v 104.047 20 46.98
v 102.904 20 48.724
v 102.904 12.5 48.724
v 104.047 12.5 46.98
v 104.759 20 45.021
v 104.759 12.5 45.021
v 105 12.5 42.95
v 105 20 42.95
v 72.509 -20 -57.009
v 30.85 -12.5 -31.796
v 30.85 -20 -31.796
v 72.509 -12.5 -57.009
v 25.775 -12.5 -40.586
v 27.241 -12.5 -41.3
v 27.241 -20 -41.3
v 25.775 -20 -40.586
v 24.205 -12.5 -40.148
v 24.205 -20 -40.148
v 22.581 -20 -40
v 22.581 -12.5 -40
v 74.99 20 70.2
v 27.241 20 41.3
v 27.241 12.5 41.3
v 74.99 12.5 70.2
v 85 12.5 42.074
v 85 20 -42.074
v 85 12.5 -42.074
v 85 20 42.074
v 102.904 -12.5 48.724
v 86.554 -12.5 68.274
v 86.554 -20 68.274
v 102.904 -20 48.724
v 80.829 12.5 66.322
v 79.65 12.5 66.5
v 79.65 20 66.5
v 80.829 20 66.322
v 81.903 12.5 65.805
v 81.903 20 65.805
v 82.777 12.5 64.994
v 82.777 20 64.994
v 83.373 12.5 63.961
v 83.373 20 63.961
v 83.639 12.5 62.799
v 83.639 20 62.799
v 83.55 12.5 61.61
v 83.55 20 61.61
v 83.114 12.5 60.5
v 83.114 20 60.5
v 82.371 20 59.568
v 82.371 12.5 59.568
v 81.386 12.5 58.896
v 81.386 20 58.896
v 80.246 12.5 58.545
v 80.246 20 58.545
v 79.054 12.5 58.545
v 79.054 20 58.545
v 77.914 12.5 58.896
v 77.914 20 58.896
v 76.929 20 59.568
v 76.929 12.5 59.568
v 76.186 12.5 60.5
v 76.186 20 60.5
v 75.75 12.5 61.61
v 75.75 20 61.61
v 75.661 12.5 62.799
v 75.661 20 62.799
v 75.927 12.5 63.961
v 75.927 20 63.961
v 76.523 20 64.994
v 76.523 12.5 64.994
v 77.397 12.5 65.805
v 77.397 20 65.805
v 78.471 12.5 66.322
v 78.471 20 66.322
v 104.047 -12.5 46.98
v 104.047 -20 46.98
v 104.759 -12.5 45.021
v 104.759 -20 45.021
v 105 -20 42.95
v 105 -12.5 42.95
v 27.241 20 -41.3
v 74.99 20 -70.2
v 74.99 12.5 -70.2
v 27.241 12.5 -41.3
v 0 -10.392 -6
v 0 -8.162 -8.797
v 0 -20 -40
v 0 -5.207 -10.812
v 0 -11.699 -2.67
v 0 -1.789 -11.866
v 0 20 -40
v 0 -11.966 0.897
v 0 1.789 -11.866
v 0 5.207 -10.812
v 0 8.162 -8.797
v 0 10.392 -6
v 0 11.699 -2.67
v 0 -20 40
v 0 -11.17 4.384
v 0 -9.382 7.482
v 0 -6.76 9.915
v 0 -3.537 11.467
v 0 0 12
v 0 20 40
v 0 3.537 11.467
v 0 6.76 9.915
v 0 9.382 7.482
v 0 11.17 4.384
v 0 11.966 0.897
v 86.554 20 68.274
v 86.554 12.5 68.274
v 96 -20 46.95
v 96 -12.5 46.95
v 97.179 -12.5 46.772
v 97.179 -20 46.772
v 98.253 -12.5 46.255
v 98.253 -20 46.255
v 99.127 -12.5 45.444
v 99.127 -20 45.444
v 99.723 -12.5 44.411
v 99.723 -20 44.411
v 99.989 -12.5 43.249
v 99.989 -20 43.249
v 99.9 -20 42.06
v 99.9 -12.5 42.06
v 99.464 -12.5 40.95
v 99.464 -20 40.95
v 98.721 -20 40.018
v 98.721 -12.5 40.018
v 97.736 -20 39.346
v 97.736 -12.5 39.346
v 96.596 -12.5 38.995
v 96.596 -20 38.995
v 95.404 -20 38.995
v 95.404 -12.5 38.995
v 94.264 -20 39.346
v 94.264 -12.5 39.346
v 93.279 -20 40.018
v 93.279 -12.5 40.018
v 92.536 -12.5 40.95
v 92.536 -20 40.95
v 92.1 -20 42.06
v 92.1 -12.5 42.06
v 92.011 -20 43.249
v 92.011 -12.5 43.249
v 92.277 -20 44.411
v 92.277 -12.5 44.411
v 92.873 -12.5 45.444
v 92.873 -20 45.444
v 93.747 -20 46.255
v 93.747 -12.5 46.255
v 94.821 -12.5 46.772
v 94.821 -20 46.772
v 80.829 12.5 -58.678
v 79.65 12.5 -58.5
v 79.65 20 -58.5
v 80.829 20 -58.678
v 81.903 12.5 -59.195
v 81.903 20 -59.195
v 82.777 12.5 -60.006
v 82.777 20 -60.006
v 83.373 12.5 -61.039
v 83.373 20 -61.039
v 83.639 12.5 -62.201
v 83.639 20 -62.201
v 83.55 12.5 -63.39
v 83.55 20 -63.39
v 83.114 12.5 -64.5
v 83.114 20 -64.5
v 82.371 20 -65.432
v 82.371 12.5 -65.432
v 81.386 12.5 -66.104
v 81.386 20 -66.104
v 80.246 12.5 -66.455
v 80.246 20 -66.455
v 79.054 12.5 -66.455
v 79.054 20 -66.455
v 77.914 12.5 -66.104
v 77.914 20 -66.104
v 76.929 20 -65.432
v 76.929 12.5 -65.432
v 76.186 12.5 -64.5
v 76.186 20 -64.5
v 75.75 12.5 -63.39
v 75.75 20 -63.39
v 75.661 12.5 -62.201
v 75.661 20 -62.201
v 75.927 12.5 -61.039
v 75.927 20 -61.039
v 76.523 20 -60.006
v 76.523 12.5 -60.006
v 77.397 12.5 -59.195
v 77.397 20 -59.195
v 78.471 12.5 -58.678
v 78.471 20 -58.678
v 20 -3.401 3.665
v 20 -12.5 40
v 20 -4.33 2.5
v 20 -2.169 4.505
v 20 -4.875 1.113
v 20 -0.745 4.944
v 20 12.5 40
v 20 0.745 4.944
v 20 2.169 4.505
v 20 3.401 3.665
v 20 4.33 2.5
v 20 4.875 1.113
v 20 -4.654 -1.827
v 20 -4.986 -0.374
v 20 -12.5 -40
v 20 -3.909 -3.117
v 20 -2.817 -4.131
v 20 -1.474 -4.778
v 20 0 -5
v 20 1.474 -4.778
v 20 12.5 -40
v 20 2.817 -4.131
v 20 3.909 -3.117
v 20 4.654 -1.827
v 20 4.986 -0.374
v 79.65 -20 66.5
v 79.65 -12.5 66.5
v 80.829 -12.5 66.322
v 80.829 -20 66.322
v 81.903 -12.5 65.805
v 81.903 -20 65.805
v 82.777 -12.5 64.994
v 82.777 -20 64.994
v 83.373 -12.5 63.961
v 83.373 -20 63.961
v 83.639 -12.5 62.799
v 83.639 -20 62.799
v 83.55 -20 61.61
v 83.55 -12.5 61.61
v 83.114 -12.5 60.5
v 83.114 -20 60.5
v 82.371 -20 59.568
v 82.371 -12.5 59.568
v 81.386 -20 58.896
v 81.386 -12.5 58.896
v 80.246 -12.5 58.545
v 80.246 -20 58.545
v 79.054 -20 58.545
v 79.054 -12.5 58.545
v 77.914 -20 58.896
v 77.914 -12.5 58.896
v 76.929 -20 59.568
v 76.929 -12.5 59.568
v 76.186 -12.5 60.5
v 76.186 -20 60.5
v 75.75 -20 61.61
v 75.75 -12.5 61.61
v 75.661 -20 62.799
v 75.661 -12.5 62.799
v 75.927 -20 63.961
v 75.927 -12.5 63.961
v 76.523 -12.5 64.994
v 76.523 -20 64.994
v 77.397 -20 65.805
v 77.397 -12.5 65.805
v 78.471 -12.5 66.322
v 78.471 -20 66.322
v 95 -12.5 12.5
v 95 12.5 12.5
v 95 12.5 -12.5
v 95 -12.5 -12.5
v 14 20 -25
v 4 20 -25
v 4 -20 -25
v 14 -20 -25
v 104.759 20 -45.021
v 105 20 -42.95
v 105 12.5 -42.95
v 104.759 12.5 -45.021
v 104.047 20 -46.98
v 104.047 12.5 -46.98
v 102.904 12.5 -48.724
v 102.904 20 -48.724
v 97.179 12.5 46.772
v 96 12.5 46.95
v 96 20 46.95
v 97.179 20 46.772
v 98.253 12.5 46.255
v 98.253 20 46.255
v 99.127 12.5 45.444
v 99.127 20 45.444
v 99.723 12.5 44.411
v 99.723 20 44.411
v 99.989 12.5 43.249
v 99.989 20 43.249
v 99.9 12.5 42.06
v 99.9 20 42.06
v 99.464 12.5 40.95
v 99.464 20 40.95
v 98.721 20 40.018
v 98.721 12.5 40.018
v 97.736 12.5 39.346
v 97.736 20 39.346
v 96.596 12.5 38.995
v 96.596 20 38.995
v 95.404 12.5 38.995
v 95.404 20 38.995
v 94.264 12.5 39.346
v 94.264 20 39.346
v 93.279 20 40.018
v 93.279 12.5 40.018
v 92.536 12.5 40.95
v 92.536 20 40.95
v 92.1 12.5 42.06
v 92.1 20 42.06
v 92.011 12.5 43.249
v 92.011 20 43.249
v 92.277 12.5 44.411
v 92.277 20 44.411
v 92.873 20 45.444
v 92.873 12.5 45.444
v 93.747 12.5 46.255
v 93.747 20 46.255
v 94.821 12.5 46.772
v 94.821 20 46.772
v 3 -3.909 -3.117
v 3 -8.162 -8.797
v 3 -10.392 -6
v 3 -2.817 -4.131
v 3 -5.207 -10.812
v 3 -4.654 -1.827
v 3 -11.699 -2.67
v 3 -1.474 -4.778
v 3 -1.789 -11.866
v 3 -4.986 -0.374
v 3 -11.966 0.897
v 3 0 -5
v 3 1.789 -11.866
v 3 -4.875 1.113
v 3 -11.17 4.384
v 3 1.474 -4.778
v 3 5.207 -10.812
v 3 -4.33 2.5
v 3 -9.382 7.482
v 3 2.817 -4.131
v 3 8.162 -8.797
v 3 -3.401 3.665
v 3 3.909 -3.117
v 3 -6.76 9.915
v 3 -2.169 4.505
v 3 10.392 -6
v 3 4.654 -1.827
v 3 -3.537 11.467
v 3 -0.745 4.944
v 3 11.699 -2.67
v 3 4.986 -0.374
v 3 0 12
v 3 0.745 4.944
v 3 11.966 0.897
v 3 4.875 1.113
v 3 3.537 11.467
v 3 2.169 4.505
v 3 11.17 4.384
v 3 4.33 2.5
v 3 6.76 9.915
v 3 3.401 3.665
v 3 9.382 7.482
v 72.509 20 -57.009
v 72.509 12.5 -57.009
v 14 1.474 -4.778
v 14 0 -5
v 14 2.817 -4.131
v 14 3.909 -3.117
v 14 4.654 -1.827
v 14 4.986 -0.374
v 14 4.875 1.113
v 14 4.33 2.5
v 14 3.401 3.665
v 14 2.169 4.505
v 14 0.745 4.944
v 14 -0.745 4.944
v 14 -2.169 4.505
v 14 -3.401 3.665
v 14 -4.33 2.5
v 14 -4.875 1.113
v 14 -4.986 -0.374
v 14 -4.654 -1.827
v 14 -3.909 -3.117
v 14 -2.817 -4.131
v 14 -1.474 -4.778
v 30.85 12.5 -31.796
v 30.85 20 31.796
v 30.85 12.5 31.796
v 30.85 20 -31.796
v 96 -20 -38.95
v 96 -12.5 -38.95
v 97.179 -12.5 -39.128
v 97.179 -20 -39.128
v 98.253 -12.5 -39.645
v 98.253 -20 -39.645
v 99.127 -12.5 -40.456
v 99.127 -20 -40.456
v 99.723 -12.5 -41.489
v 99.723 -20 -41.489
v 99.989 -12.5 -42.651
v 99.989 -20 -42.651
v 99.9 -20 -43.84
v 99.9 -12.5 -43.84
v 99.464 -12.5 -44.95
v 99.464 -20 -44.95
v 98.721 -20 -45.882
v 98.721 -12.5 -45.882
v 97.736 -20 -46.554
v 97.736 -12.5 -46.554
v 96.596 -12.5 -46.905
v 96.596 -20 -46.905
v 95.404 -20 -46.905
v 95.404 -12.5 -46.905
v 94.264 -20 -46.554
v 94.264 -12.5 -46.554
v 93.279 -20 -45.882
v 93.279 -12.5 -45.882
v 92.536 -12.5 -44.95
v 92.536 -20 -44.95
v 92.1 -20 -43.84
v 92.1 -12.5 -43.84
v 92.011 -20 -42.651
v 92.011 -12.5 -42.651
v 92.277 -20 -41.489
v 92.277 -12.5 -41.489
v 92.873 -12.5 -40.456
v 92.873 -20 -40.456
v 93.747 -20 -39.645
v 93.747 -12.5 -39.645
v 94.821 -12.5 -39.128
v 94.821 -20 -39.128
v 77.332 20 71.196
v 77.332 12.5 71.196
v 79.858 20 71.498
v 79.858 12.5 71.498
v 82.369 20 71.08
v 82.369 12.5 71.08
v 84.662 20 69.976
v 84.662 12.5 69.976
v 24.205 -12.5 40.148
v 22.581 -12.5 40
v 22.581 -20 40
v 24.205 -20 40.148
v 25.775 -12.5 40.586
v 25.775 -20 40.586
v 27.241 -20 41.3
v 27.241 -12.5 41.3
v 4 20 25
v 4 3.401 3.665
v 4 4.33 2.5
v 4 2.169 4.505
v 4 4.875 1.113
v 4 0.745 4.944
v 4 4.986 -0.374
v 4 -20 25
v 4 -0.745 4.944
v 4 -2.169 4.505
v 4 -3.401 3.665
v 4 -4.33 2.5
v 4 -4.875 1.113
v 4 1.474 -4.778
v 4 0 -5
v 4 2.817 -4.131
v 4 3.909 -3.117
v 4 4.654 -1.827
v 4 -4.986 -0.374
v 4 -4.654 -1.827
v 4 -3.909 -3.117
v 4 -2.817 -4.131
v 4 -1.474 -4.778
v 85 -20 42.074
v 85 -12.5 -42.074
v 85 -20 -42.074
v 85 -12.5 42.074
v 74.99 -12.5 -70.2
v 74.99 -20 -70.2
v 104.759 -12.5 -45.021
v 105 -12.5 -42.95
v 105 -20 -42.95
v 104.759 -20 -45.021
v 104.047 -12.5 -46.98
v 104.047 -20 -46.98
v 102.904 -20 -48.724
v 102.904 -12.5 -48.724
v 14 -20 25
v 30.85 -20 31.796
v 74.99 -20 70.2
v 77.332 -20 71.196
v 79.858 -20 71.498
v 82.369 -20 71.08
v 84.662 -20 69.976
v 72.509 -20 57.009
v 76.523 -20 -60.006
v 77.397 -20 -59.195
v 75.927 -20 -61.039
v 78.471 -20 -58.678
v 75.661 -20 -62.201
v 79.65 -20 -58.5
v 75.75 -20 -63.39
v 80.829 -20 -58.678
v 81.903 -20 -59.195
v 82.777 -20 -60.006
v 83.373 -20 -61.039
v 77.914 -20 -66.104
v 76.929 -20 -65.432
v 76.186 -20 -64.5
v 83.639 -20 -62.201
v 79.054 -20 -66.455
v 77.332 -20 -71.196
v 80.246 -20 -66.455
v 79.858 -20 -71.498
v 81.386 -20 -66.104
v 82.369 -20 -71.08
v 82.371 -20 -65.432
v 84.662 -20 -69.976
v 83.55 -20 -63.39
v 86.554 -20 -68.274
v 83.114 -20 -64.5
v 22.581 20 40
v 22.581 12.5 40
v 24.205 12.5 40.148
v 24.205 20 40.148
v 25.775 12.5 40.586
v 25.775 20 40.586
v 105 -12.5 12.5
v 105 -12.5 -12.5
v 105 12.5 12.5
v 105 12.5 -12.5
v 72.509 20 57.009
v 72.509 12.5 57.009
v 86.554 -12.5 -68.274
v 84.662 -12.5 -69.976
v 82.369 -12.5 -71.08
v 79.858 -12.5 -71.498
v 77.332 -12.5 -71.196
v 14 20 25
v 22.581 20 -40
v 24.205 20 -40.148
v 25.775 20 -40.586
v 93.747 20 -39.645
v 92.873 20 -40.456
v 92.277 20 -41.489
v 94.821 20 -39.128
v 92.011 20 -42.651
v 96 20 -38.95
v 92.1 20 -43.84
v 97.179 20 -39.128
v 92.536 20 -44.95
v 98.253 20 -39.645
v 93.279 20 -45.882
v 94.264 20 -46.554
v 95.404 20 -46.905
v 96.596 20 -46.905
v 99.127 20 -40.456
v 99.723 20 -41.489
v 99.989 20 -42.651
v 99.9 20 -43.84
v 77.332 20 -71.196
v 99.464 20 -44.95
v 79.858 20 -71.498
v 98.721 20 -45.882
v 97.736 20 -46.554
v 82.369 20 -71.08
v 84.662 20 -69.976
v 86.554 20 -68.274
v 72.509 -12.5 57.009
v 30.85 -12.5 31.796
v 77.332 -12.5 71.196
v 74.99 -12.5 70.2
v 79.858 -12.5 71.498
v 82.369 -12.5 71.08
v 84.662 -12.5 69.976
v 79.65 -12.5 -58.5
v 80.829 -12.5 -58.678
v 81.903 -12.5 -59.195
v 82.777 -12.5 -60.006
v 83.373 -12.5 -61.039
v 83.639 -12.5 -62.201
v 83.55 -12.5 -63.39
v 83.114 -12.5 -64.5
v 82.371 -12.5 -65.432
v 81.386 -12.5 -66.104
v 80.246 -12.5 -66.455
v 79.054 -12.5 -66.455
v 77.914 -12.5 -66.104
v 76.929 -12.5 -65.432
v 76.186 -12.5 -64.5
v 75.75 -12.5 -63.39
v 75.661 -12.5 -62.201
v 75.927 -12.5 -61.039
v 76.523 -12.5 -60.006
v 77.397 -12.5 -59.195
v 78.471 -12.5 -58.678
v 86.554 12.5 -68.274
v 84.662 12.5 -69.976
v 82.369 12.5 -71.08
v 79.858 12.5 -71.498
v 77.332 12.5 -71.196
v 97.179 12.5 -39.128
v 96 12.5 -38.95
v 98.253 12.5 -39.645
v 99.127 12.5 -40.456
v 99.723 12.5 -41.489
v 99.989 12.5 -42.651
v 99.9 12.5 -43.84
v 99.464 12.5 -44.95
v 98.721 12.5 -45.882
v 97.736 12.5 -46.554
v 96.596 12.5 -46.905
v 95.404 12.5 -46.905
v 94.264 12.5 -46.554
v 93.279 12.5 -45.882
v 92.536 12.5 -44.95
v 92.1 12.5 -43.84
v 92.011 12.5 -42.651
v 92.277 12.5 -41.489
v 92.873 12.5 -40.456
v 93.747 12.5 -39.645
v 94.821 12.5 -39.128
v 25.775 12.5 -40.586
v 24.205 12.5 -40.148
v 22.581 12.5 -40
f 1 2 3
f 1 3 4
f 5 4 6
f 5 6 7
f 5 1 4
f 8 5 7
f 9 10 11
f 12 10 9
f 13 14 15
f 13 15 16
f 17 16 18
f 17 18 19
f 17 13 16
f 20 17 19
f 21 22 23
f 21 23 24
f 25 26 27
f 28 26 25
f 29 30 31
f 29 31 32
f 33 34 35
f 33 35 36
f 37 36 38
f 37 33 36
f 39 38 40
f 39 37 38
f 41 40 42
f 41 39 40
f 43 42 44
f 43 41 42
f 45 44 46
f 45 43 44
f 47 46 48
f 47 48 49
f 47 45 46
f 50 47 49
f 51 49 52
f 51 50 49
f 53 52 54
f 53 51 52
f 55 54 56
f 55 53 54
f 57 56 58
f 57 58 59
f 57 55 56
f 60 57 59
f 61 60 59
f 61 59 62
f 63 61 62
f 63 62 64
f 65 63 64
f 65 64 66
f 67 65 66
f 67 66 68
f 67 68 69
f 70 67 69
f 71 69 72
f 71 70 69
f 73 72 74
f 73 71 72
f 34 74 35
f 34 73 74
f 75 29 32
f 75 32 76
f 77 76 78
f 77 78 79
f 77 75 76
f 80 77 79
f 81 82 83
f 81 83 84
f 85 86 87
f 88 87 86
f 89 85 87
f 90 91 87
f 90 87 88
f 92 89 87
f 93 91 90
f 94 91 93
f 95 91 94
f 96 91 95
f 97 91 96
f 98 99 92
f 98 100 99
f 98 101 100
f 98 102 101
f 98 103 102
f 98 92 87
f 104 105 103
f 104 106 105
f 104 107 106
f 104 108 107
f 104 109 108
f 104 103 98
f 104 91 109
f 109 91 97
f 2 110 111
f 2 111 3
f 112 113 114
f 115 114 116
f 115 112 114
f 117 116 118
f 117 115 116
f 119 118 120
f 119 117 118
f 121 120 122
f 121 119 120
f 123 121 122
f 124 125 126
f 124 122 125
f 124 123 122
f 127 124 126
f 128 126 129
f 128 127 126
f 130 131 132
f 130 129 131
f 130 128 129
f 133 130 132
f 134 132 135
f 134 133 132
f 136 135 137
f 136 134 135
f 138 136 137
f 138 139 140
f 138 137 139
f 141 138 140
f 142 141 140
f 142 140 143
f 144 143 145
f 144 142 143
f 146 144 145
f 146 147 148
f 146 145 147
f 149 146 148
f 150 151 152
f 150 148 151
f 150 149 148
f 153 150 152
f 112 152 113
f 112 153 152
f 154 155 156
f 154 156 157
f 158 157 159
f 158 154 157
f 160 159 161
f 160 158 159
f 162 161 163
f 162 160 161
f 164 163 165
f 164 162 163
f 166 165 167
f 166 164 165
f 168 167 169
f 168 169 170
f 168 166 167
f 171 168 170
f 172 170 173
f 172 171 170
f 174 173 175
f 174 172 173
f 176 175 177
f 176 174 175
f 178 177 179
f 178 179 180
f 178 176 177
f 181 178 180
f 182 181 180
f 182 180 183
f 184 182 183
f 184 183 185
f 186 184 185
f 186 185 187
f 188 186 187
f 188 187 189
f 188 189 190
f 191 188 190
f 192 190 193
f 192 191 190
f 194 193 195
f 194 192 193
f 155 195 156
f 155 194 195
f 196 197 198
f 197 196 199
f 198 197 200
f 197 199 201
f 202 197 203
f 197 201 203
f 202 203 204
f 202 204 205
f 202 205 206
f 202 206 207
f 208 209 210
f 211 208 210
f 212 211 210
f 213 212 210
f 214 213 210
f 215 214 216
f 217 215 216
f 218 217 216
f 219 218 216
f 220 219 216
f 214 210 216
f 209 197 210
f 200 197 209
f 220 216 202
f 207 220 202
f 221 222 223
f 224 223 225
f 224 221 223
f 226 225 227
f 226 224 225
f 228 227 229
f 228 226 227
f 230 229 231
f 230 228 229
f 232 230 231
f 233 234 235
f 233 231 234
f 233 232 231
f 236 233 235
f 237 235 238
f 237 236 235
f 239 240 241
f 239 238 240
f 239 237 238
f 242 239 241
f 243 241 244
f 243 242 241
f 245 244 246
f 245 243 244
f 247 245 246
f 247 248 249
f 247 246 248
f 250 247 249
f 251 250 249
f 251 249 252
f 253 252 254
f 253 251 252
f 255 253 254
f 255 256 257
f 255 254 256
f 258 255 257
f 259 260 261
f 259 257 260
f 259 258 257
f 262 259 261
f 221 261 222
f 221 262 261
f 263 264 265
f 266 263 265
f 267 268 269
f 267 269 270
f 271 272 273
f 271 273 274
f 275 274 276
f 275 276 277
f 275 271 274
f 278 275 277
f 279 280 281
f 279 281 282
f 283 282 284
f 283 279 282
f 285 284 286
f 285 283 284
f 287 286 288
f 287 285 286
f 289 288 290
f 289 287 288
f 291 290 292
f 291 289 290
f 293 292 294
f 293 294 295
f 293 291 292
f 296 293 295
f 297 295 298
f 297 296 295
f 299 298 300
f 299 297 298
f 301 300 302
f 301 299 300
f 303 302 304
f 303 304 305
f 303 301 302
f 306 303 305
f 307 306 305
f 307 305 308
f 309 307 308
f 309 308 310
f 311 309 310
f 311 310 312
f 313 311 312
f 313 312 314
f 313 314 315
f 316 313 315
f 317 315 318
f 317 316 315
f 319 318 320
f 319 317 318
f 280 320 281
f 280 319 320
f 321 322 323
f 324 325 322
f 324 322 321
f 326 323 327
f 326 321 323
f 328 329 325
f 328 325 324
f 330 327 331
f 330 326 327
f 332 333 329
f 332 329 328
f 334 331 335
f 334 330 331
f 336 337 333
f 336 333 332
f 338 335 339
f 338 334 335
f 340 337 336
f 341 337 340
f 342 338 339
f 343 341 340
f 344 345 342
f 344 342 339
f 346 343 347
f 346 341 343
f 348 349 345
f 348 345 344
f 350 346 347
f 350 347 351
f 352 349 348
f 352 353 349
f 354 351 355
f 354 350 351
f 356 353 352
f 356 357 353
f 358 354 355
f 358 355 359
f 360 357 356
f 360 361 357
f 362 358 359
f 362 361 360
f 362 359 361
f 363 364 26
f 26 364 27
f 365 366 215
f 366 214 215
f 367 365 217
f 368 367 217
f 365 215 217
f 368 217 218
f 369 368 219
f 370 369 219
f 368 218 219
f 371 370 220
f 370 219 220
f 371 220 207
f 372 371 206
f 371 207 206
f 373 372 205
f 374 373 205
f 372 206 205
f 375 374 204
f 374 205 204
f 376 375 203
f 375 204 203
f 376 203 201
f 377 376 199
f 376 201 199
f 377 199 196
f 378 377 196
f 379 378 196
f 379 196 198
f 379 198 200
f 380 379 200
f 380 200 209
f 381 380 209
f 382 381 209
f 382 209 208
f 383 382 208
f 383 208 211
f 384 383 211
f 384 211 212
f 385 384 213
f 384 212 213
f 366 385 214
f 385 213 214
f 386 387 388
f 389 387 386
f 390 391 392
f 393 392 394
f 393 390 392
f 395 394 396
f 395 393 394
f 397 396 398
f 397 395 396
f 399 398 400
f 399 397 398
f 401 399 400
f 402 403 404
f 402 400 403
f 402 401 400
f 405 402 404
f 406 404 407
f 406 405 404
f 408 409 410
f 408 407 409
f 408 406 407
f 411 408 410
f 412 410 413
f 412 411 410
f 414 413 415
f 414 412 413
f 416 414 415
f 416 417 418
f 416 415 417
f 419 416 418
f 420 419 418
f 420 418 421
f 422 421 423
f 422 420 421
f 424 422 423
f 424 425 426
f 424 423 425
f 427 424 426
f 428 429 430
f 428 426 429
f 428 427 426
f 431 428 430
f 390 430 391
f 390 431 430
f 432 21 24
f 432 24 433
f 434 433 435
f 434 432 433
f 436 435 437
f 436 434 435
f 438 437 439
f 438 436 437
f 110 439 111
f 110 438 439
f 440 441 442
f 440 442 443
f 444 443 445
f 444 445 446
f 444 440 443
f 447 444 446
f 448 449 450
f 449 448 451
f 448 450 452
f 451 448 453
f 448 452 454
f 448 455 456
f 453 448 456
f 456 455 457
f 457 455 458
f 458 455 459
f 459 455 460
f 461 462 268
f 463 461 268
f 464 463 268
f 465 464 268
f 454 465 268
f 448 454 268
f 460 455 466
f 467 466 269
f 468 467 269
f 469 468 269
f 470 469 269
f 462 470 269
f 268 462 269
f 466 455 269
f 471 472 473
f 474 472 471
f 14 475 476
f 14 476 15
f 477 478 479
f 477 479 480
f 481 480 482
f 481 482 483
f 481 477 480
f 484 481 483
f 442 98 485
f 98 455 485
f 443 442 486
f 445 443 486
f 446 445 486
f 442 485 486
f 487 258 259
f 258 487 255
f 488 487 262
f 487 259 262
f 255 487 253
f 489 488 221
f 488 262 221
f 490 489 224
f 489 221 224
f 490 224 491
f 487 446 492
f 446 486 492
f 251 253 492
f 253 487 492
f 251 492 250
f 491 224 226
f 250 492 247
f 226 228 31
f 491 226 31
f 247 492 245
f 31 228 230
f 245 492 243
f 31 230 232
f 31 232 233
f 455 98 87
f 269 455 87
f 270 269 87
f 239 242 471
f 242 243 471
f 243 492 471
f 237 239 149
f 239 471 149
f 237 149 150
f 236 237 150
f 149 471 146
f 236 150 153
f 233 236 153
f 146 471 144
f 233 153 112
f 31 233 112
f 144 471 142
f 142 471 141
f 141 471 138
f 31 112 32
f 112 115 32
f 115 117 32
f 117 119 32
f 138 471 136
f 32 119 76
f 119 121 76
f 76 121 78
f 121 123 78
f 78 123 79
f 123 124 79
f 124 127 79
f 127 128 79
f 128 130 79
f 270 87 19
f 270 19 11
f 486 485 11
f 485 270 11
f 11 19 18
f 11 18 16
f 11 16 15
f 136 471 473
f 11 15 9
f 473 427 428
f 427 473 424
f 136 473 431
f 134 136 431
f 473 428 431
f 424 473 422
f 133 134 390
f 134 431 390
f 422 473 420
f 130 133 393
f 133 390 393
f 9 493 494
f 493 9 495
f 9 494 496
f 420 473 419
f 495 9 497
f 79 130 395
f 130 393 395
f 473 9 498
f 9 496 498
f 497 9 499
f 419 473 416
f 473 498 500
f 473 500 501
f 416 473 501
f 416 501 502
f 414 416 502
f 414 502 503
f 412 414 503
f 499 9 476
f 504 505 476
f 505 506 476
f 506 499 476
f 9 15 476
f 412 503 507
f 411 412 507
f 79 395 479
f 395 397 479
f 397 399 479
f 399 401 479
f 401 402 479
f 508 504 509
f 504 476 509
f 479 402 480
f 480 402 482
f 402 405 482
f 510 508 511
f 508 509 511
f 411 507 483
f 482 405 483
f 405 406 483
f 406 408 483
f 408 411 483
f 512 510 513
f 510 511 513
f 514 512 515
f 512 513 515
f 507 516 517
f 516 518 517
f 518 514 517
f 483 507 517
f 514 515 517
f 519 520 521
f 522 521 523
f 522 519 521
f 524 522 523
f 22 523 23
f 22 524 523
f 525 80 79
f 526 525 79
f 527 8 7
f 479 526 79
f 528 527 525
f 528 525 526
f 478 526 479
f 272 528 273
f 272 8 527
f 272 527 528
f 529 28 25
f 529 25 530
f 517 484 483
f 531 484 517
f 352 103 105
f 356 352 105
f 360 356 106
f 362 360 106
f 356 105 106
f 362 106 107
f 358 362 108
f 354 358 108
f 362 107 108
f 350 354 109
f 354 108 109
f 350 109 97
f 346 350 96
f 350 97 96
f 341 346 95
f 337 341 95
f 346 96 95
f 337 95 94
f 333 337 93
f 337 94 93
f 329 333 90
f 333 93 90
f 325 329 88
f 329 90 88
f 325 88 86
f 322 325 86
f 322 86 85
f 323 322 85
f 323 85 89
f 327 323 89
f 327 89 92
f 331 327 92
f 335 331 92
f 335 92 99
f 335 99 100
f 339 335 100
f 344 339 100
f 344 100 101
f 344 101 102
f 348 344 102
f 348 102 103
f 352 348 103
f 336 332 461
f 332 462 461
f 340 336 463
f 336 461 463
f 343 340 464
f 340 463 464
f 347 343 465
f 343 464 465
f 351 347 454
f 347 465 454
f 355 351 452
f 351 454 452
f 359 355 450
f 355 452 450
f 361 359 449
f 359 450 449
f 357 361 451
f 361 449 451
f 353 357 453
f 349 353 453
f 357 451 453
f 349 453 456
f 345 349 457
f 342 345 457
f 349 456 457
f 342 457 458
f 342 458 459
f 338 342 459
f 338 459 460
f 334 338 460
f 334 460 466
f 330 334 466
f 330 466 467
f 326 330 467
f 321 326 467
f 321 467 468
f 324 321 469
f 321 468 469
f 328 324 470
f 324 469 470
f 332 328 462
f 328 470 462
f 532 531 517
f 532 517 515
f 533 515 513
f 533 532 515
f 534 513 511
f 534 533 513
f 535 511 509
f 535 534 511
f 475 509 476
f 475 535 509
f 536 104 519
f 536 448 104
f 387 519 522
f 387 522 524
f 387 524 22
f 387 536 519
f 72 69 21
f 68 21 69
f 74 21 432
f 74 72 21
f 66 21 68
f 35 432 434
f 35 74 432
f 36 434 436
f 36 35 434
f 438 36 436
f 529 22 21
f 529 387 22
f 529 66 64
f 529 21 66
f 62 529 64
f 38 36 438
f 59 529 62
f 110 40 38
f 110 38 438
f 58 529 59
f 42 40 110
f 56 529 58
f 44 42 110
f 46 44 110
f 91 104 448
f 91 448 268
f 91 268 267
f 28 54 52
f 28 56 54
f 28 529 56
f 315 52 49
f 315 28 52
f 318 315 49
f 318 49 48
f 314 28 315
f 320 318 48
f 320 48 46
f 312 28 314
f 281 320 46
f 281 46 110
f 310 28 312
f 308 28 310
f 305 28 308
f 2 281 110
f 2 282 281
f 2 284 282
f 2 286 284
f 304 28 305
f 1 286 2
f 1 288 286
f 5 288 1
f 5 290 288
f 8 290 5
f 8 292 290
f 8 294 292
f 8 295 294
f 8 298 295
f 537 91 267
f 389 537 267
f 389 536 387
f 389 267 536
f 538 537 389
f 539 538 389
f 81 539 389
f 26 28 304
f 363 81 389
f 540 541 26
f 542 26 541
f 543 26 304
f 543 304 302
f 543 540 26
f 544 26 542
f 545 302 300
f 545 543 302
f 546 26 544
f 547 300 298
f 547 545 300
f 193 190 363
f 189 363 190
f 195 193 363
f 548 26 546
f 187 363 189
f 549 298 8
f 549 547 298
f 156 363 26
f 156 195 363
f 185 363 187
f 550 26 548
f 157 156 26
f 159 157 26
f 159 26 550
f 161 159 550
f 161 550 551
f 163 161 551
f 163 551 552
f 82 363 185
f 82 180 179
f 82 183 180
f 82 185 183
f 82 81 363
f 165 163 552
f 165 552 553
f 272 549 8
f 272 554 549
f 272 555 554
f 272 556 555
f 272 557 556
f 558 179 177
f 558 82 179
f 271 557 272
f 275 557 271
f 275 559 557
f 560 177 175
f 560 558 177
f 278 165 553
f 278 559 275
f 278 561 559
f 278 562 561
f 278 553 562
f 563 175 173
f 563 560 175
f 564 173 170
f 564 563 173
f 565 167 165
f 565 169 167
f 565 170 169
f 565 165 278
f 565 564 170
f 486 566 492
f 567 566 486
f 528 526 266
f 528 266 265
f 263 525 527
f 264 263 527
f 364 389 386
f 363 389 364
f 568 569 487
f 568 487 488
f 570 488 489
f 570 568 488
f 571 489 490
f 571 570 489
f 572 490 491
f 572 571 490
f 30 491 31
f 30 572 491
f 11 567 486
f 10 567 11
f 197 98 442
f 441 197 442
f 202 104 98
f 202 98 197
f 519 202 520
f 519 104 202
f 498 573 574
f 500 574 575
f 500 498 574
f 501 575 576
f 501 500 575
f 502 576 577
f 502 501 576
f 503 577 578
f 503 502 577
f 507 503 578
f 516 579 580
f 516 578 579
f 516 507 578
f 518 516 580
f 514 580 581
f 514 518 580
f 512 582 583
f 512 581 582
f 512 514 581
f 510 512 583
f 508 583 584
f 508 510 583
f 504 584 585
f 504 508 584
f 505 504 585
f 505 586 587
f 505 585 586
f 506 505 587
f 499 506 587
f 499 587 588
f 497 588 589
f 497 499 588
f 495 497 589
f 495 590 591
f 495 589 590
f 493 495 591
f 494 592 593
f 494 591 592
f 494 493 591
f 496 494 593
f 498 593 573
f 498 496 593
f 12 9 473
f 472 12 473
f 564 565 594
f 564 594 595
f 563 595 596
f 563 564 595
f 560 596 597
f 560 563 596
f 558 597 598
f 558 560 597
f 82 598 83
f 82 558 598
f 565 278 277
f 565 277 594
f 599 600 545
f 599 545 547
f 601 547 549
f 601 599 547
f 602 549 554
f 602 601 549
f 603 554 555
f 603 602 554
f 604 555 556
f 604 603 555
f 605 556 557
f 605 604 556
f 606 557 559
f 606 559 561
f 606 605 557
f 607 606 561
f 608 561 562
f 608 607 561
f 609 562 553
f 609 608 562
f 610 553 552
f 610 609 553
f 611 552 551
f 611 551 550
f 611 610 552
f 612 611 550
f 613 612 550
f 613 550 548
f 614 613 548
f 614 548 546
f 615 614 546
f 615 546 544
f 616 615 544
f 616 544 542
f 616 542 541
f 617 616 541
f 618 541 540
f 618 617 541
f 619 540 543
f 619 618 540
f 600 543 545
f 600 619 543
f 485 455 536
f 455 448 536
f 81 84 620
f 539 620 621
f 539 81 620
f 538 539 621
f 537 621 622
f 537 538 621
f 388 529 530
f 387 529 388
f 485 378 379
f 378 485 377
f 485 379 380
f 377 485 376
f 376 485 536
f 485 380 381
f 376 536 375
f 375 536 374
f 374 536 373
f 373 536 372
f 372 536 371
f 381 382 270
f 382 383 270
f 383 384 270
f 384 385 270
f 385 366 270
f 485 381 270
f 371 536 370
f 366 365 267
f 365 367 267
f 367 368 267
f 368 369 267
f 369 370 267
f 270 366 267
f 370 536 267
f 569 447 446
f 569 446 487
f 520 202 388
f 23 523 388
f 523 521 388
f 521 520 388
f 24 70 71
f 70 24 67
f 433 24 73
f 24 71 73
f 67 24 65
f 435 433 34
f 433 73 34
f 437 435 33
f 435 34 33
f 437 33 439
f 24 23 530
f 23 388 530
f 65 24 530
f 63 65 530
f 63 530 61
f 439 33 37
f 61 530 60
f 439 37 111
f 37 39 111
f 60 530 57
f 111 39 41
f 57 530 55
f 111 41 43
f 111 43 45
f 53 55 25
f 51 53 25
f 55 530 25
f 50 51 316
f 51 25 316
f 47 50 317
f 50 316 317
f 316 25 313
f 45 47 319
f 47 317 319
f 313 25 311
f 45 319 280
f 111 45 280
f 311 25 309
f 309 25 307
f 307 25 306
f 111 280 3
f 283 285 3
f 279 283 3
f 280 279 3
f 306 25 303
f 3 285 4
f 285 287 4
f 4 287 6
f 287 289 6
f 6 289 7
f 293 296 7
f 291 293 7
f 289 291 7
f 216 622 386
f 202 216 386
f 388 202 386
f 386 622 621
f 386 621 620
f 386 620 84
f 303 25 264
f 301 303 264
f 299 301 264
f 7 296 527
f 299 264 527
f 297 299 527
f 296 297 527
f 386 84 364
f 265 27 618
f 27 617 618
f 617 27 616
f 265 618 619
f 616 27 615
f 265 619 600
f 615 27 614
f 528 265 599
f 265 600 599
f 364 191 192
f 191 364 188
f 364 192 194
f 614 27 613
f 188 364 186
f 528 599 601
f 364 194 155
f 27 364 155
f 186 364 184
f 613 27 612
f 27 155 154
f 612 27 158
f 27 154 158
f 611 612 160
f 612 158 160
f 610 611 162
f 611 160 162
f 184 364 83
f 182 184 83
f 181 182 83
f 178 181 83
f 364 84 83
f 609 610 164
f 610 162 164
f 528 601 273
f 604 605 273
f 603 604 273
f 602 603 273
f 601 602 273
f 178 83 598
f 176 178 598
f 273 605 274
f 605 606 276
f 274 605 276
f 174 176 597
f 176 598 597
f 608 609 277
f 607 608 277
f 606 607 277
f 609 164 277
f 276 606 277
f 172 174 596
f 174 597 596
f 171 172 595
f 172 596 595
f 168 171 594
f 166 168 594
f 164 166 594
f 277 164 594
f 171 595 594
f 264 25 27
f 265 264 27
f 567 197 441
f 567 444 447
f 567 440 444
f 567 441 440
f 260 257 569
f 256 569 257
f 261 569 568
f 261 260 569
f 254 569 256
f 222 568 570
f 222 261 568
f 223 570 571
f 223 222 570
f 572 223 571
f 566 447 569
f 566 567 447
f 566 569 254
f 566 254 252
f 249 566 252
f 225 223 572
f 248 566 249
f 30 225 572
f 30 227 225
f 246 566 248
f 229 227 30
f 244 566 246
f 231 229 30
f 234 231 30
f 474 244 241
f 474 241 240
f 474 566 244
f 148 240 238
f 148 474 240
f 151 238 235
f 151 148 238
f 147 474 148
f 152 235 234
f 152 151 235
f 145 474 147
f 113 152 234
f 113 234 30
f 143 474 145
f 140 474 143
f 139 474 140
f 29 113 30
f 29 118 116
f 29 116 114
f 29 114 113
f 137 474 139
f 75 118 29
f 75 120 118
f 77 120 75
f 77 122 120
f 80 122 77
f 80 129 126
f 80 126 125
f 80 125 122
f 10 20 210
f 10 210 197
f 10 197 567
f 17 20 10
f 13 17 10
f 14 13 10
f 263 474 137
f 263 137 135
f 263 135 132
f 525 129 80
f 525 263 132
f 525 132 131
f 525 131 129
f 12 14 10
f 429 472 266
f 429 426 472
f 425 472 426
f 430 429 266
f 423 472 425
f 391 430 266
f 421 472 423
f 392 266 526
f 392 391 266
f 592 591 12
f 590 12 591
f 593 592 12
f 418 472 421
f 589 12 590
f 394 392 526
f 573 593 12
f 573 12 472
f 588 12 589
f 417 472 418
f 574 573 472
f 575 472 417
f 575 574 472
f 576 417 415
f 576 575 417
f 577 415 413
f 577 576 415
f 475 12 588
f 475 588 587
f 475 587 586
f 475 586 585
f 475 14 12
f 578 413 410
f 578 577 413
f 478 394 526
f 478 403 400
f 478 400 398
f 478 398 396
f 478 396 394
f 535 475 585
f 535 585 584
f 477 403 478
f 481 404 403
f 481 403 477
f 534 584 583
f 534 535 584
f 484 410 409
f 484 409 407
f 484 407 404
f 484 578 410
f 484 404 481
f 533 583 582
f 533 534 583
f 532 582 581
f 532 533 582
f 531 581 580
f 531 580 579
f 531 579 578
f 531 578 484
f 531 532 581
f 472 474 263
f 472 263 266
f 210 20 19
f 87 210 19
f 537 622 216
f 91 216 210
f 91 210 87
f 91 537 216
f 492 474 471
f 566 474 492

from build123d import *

# Parameters (mm, degrees)
SKETCH1_R               = 4
SKETCH1_W               = 10
SKETCH1_H               = 50
BOSS_EXTRUDE2_DEPTH     = 20
CUT_EXTRUDE1_DEPTH      = 129.597239473
CUT_EXTRUDE1_DEPTH_BACK = 129.597239473
SKETCH4_W               = 85
SKETCH4_H               = 25
SKETCH5_W               = 25
SKETCH5_H               = 25
BOSS_EXTRUDE4_DEPTH     = 10
HOLE1_D                 = 10
HOLE1_DEPTH             = 20
HOLE1_CBORE_D           = 24
HOLE1_CBORE_DEPTH       = 3


with BuildPart() as part:
    # Sketch1 → Boss-Extrude2 (new, symmetric)
    with BuildSketch(Plane(origin=(0, 0, 0), x_dir=(1, 0, 0), z_dir=(0, 1, 0))):
        with BuildLine():
            Line((74.989948747, 70.199605335), (27.241006815, 41.300394665))
            ThreePointArc((27.241006815, 41.300394665), (25, 40.331192469), (22.580955562, 40))
            Line((22.580955562, 40), (0, 40))
            Line((0, 40), (0, -40))
            Line((0, -40), (22.580955562, -40))
            ThreePointArc((22.580955562, -40), (25, -40.331192469), (27.241006815, -41.300394665))
            Line((27.241006815, -41.300394665), (74.989948747, -70.199605335))
            ThreePointArc((74.989948747, -70.199605335), (81.12845593, -71.377734399), (86.553849817, -68.273807903))
            Line((86.553849817, -68.273807903), (102.903849817, -48.723807903))
            ThreePointArc((102.903849817, -48.723807903), (104.459747288, -46.02126616), (105, -42.95))
            Line((105, -42.95), (105, 42.95))
            ThreePointArc((105, 42.95), (104.459747288, 46.02126616), (102.903849817, 48.723807903))
            Line((102.903849817, 48.723807903), (86.553849817, 68.273807903))
            ThreePointArc((86.553849817, 68.273807903), (81.12845593, 71.377734399), (74.989948747, 70.199605335))
        make_face()
        with Locations(Location((79.65, 62.5, 0), (0, 0, 270))):
            Circle(SKETCH1_R, mode=Mode.SUBTRACT)
        with Locations(Location((96, 42.95, 0), (0, 0, 270))):
            Circle(SKETCH1_R, mode=Mode.SUBTRACT)
        with Locations(Location((96, -42.95, 0), (0, 0, 270))):
            Circle(SKETCH1_R, mode=Mode.SUBTRACT)
        with Locations(Location((79.65, -62.5, 0), (0, 0, 270))):
            Circle(SKETCH1_R, mode=Mode.SUBTRACT)
        Polygon((30.85, -31.795763765), (30.85, 31.795763765), (72.509340505, 57.009349846), (85, 42.074035282), (85, -42.074035282), (72.509340505, -57.009349846), align=None, mode=Mode.SUBTRACT)
        with Locations((9, 0)):
            Rectangle(SKETCH1_W, SKETCH1_H, mode=Mode.SUBTRACT)
    extrude(amount=BOSS_EXTRUDE2_DEPTH, both=True)

    # Sketch4 → Cut-Extrude1 (cut, two sides: drawn at the far end of the back side and taken through both)
    with BuildSketch(Plane.XY.offset(-CUT_EXTRUDE1_DEPTH_BACK)):
        with Locations((62.5, 0)):
            Rectangle(SKETCH4_W, SKETCH4_H)
    extrude(amount=CUT_EXTRUDE1_DEPTH + CUT_EXTRUDE1_DEPTH_BACK, mode=Mode.SUBTRACT)

    # Sketch5 → Boss-Extrude4 (add)
    with BuildSketch(Plane(origin=(105, 0, 0), x_dir=(0, 0, -1), z_dir=(1, 0, 0))):
        Rectangle(SKETCH5_W, SKETCH5_H)
    extrude(amount=-BOSS_EXTRUDE4_DEPTH)

    # Hole1
    with Locations(Plane.ZY):
        with Locations((0, 0)):
            CounterBoreHole(HOLE1_D / 2, HOLE1_CBORE_D / 2, HOLE1_CBORE_DEPTH, depth=HOLE1_DEPTH)


solid = part.part
